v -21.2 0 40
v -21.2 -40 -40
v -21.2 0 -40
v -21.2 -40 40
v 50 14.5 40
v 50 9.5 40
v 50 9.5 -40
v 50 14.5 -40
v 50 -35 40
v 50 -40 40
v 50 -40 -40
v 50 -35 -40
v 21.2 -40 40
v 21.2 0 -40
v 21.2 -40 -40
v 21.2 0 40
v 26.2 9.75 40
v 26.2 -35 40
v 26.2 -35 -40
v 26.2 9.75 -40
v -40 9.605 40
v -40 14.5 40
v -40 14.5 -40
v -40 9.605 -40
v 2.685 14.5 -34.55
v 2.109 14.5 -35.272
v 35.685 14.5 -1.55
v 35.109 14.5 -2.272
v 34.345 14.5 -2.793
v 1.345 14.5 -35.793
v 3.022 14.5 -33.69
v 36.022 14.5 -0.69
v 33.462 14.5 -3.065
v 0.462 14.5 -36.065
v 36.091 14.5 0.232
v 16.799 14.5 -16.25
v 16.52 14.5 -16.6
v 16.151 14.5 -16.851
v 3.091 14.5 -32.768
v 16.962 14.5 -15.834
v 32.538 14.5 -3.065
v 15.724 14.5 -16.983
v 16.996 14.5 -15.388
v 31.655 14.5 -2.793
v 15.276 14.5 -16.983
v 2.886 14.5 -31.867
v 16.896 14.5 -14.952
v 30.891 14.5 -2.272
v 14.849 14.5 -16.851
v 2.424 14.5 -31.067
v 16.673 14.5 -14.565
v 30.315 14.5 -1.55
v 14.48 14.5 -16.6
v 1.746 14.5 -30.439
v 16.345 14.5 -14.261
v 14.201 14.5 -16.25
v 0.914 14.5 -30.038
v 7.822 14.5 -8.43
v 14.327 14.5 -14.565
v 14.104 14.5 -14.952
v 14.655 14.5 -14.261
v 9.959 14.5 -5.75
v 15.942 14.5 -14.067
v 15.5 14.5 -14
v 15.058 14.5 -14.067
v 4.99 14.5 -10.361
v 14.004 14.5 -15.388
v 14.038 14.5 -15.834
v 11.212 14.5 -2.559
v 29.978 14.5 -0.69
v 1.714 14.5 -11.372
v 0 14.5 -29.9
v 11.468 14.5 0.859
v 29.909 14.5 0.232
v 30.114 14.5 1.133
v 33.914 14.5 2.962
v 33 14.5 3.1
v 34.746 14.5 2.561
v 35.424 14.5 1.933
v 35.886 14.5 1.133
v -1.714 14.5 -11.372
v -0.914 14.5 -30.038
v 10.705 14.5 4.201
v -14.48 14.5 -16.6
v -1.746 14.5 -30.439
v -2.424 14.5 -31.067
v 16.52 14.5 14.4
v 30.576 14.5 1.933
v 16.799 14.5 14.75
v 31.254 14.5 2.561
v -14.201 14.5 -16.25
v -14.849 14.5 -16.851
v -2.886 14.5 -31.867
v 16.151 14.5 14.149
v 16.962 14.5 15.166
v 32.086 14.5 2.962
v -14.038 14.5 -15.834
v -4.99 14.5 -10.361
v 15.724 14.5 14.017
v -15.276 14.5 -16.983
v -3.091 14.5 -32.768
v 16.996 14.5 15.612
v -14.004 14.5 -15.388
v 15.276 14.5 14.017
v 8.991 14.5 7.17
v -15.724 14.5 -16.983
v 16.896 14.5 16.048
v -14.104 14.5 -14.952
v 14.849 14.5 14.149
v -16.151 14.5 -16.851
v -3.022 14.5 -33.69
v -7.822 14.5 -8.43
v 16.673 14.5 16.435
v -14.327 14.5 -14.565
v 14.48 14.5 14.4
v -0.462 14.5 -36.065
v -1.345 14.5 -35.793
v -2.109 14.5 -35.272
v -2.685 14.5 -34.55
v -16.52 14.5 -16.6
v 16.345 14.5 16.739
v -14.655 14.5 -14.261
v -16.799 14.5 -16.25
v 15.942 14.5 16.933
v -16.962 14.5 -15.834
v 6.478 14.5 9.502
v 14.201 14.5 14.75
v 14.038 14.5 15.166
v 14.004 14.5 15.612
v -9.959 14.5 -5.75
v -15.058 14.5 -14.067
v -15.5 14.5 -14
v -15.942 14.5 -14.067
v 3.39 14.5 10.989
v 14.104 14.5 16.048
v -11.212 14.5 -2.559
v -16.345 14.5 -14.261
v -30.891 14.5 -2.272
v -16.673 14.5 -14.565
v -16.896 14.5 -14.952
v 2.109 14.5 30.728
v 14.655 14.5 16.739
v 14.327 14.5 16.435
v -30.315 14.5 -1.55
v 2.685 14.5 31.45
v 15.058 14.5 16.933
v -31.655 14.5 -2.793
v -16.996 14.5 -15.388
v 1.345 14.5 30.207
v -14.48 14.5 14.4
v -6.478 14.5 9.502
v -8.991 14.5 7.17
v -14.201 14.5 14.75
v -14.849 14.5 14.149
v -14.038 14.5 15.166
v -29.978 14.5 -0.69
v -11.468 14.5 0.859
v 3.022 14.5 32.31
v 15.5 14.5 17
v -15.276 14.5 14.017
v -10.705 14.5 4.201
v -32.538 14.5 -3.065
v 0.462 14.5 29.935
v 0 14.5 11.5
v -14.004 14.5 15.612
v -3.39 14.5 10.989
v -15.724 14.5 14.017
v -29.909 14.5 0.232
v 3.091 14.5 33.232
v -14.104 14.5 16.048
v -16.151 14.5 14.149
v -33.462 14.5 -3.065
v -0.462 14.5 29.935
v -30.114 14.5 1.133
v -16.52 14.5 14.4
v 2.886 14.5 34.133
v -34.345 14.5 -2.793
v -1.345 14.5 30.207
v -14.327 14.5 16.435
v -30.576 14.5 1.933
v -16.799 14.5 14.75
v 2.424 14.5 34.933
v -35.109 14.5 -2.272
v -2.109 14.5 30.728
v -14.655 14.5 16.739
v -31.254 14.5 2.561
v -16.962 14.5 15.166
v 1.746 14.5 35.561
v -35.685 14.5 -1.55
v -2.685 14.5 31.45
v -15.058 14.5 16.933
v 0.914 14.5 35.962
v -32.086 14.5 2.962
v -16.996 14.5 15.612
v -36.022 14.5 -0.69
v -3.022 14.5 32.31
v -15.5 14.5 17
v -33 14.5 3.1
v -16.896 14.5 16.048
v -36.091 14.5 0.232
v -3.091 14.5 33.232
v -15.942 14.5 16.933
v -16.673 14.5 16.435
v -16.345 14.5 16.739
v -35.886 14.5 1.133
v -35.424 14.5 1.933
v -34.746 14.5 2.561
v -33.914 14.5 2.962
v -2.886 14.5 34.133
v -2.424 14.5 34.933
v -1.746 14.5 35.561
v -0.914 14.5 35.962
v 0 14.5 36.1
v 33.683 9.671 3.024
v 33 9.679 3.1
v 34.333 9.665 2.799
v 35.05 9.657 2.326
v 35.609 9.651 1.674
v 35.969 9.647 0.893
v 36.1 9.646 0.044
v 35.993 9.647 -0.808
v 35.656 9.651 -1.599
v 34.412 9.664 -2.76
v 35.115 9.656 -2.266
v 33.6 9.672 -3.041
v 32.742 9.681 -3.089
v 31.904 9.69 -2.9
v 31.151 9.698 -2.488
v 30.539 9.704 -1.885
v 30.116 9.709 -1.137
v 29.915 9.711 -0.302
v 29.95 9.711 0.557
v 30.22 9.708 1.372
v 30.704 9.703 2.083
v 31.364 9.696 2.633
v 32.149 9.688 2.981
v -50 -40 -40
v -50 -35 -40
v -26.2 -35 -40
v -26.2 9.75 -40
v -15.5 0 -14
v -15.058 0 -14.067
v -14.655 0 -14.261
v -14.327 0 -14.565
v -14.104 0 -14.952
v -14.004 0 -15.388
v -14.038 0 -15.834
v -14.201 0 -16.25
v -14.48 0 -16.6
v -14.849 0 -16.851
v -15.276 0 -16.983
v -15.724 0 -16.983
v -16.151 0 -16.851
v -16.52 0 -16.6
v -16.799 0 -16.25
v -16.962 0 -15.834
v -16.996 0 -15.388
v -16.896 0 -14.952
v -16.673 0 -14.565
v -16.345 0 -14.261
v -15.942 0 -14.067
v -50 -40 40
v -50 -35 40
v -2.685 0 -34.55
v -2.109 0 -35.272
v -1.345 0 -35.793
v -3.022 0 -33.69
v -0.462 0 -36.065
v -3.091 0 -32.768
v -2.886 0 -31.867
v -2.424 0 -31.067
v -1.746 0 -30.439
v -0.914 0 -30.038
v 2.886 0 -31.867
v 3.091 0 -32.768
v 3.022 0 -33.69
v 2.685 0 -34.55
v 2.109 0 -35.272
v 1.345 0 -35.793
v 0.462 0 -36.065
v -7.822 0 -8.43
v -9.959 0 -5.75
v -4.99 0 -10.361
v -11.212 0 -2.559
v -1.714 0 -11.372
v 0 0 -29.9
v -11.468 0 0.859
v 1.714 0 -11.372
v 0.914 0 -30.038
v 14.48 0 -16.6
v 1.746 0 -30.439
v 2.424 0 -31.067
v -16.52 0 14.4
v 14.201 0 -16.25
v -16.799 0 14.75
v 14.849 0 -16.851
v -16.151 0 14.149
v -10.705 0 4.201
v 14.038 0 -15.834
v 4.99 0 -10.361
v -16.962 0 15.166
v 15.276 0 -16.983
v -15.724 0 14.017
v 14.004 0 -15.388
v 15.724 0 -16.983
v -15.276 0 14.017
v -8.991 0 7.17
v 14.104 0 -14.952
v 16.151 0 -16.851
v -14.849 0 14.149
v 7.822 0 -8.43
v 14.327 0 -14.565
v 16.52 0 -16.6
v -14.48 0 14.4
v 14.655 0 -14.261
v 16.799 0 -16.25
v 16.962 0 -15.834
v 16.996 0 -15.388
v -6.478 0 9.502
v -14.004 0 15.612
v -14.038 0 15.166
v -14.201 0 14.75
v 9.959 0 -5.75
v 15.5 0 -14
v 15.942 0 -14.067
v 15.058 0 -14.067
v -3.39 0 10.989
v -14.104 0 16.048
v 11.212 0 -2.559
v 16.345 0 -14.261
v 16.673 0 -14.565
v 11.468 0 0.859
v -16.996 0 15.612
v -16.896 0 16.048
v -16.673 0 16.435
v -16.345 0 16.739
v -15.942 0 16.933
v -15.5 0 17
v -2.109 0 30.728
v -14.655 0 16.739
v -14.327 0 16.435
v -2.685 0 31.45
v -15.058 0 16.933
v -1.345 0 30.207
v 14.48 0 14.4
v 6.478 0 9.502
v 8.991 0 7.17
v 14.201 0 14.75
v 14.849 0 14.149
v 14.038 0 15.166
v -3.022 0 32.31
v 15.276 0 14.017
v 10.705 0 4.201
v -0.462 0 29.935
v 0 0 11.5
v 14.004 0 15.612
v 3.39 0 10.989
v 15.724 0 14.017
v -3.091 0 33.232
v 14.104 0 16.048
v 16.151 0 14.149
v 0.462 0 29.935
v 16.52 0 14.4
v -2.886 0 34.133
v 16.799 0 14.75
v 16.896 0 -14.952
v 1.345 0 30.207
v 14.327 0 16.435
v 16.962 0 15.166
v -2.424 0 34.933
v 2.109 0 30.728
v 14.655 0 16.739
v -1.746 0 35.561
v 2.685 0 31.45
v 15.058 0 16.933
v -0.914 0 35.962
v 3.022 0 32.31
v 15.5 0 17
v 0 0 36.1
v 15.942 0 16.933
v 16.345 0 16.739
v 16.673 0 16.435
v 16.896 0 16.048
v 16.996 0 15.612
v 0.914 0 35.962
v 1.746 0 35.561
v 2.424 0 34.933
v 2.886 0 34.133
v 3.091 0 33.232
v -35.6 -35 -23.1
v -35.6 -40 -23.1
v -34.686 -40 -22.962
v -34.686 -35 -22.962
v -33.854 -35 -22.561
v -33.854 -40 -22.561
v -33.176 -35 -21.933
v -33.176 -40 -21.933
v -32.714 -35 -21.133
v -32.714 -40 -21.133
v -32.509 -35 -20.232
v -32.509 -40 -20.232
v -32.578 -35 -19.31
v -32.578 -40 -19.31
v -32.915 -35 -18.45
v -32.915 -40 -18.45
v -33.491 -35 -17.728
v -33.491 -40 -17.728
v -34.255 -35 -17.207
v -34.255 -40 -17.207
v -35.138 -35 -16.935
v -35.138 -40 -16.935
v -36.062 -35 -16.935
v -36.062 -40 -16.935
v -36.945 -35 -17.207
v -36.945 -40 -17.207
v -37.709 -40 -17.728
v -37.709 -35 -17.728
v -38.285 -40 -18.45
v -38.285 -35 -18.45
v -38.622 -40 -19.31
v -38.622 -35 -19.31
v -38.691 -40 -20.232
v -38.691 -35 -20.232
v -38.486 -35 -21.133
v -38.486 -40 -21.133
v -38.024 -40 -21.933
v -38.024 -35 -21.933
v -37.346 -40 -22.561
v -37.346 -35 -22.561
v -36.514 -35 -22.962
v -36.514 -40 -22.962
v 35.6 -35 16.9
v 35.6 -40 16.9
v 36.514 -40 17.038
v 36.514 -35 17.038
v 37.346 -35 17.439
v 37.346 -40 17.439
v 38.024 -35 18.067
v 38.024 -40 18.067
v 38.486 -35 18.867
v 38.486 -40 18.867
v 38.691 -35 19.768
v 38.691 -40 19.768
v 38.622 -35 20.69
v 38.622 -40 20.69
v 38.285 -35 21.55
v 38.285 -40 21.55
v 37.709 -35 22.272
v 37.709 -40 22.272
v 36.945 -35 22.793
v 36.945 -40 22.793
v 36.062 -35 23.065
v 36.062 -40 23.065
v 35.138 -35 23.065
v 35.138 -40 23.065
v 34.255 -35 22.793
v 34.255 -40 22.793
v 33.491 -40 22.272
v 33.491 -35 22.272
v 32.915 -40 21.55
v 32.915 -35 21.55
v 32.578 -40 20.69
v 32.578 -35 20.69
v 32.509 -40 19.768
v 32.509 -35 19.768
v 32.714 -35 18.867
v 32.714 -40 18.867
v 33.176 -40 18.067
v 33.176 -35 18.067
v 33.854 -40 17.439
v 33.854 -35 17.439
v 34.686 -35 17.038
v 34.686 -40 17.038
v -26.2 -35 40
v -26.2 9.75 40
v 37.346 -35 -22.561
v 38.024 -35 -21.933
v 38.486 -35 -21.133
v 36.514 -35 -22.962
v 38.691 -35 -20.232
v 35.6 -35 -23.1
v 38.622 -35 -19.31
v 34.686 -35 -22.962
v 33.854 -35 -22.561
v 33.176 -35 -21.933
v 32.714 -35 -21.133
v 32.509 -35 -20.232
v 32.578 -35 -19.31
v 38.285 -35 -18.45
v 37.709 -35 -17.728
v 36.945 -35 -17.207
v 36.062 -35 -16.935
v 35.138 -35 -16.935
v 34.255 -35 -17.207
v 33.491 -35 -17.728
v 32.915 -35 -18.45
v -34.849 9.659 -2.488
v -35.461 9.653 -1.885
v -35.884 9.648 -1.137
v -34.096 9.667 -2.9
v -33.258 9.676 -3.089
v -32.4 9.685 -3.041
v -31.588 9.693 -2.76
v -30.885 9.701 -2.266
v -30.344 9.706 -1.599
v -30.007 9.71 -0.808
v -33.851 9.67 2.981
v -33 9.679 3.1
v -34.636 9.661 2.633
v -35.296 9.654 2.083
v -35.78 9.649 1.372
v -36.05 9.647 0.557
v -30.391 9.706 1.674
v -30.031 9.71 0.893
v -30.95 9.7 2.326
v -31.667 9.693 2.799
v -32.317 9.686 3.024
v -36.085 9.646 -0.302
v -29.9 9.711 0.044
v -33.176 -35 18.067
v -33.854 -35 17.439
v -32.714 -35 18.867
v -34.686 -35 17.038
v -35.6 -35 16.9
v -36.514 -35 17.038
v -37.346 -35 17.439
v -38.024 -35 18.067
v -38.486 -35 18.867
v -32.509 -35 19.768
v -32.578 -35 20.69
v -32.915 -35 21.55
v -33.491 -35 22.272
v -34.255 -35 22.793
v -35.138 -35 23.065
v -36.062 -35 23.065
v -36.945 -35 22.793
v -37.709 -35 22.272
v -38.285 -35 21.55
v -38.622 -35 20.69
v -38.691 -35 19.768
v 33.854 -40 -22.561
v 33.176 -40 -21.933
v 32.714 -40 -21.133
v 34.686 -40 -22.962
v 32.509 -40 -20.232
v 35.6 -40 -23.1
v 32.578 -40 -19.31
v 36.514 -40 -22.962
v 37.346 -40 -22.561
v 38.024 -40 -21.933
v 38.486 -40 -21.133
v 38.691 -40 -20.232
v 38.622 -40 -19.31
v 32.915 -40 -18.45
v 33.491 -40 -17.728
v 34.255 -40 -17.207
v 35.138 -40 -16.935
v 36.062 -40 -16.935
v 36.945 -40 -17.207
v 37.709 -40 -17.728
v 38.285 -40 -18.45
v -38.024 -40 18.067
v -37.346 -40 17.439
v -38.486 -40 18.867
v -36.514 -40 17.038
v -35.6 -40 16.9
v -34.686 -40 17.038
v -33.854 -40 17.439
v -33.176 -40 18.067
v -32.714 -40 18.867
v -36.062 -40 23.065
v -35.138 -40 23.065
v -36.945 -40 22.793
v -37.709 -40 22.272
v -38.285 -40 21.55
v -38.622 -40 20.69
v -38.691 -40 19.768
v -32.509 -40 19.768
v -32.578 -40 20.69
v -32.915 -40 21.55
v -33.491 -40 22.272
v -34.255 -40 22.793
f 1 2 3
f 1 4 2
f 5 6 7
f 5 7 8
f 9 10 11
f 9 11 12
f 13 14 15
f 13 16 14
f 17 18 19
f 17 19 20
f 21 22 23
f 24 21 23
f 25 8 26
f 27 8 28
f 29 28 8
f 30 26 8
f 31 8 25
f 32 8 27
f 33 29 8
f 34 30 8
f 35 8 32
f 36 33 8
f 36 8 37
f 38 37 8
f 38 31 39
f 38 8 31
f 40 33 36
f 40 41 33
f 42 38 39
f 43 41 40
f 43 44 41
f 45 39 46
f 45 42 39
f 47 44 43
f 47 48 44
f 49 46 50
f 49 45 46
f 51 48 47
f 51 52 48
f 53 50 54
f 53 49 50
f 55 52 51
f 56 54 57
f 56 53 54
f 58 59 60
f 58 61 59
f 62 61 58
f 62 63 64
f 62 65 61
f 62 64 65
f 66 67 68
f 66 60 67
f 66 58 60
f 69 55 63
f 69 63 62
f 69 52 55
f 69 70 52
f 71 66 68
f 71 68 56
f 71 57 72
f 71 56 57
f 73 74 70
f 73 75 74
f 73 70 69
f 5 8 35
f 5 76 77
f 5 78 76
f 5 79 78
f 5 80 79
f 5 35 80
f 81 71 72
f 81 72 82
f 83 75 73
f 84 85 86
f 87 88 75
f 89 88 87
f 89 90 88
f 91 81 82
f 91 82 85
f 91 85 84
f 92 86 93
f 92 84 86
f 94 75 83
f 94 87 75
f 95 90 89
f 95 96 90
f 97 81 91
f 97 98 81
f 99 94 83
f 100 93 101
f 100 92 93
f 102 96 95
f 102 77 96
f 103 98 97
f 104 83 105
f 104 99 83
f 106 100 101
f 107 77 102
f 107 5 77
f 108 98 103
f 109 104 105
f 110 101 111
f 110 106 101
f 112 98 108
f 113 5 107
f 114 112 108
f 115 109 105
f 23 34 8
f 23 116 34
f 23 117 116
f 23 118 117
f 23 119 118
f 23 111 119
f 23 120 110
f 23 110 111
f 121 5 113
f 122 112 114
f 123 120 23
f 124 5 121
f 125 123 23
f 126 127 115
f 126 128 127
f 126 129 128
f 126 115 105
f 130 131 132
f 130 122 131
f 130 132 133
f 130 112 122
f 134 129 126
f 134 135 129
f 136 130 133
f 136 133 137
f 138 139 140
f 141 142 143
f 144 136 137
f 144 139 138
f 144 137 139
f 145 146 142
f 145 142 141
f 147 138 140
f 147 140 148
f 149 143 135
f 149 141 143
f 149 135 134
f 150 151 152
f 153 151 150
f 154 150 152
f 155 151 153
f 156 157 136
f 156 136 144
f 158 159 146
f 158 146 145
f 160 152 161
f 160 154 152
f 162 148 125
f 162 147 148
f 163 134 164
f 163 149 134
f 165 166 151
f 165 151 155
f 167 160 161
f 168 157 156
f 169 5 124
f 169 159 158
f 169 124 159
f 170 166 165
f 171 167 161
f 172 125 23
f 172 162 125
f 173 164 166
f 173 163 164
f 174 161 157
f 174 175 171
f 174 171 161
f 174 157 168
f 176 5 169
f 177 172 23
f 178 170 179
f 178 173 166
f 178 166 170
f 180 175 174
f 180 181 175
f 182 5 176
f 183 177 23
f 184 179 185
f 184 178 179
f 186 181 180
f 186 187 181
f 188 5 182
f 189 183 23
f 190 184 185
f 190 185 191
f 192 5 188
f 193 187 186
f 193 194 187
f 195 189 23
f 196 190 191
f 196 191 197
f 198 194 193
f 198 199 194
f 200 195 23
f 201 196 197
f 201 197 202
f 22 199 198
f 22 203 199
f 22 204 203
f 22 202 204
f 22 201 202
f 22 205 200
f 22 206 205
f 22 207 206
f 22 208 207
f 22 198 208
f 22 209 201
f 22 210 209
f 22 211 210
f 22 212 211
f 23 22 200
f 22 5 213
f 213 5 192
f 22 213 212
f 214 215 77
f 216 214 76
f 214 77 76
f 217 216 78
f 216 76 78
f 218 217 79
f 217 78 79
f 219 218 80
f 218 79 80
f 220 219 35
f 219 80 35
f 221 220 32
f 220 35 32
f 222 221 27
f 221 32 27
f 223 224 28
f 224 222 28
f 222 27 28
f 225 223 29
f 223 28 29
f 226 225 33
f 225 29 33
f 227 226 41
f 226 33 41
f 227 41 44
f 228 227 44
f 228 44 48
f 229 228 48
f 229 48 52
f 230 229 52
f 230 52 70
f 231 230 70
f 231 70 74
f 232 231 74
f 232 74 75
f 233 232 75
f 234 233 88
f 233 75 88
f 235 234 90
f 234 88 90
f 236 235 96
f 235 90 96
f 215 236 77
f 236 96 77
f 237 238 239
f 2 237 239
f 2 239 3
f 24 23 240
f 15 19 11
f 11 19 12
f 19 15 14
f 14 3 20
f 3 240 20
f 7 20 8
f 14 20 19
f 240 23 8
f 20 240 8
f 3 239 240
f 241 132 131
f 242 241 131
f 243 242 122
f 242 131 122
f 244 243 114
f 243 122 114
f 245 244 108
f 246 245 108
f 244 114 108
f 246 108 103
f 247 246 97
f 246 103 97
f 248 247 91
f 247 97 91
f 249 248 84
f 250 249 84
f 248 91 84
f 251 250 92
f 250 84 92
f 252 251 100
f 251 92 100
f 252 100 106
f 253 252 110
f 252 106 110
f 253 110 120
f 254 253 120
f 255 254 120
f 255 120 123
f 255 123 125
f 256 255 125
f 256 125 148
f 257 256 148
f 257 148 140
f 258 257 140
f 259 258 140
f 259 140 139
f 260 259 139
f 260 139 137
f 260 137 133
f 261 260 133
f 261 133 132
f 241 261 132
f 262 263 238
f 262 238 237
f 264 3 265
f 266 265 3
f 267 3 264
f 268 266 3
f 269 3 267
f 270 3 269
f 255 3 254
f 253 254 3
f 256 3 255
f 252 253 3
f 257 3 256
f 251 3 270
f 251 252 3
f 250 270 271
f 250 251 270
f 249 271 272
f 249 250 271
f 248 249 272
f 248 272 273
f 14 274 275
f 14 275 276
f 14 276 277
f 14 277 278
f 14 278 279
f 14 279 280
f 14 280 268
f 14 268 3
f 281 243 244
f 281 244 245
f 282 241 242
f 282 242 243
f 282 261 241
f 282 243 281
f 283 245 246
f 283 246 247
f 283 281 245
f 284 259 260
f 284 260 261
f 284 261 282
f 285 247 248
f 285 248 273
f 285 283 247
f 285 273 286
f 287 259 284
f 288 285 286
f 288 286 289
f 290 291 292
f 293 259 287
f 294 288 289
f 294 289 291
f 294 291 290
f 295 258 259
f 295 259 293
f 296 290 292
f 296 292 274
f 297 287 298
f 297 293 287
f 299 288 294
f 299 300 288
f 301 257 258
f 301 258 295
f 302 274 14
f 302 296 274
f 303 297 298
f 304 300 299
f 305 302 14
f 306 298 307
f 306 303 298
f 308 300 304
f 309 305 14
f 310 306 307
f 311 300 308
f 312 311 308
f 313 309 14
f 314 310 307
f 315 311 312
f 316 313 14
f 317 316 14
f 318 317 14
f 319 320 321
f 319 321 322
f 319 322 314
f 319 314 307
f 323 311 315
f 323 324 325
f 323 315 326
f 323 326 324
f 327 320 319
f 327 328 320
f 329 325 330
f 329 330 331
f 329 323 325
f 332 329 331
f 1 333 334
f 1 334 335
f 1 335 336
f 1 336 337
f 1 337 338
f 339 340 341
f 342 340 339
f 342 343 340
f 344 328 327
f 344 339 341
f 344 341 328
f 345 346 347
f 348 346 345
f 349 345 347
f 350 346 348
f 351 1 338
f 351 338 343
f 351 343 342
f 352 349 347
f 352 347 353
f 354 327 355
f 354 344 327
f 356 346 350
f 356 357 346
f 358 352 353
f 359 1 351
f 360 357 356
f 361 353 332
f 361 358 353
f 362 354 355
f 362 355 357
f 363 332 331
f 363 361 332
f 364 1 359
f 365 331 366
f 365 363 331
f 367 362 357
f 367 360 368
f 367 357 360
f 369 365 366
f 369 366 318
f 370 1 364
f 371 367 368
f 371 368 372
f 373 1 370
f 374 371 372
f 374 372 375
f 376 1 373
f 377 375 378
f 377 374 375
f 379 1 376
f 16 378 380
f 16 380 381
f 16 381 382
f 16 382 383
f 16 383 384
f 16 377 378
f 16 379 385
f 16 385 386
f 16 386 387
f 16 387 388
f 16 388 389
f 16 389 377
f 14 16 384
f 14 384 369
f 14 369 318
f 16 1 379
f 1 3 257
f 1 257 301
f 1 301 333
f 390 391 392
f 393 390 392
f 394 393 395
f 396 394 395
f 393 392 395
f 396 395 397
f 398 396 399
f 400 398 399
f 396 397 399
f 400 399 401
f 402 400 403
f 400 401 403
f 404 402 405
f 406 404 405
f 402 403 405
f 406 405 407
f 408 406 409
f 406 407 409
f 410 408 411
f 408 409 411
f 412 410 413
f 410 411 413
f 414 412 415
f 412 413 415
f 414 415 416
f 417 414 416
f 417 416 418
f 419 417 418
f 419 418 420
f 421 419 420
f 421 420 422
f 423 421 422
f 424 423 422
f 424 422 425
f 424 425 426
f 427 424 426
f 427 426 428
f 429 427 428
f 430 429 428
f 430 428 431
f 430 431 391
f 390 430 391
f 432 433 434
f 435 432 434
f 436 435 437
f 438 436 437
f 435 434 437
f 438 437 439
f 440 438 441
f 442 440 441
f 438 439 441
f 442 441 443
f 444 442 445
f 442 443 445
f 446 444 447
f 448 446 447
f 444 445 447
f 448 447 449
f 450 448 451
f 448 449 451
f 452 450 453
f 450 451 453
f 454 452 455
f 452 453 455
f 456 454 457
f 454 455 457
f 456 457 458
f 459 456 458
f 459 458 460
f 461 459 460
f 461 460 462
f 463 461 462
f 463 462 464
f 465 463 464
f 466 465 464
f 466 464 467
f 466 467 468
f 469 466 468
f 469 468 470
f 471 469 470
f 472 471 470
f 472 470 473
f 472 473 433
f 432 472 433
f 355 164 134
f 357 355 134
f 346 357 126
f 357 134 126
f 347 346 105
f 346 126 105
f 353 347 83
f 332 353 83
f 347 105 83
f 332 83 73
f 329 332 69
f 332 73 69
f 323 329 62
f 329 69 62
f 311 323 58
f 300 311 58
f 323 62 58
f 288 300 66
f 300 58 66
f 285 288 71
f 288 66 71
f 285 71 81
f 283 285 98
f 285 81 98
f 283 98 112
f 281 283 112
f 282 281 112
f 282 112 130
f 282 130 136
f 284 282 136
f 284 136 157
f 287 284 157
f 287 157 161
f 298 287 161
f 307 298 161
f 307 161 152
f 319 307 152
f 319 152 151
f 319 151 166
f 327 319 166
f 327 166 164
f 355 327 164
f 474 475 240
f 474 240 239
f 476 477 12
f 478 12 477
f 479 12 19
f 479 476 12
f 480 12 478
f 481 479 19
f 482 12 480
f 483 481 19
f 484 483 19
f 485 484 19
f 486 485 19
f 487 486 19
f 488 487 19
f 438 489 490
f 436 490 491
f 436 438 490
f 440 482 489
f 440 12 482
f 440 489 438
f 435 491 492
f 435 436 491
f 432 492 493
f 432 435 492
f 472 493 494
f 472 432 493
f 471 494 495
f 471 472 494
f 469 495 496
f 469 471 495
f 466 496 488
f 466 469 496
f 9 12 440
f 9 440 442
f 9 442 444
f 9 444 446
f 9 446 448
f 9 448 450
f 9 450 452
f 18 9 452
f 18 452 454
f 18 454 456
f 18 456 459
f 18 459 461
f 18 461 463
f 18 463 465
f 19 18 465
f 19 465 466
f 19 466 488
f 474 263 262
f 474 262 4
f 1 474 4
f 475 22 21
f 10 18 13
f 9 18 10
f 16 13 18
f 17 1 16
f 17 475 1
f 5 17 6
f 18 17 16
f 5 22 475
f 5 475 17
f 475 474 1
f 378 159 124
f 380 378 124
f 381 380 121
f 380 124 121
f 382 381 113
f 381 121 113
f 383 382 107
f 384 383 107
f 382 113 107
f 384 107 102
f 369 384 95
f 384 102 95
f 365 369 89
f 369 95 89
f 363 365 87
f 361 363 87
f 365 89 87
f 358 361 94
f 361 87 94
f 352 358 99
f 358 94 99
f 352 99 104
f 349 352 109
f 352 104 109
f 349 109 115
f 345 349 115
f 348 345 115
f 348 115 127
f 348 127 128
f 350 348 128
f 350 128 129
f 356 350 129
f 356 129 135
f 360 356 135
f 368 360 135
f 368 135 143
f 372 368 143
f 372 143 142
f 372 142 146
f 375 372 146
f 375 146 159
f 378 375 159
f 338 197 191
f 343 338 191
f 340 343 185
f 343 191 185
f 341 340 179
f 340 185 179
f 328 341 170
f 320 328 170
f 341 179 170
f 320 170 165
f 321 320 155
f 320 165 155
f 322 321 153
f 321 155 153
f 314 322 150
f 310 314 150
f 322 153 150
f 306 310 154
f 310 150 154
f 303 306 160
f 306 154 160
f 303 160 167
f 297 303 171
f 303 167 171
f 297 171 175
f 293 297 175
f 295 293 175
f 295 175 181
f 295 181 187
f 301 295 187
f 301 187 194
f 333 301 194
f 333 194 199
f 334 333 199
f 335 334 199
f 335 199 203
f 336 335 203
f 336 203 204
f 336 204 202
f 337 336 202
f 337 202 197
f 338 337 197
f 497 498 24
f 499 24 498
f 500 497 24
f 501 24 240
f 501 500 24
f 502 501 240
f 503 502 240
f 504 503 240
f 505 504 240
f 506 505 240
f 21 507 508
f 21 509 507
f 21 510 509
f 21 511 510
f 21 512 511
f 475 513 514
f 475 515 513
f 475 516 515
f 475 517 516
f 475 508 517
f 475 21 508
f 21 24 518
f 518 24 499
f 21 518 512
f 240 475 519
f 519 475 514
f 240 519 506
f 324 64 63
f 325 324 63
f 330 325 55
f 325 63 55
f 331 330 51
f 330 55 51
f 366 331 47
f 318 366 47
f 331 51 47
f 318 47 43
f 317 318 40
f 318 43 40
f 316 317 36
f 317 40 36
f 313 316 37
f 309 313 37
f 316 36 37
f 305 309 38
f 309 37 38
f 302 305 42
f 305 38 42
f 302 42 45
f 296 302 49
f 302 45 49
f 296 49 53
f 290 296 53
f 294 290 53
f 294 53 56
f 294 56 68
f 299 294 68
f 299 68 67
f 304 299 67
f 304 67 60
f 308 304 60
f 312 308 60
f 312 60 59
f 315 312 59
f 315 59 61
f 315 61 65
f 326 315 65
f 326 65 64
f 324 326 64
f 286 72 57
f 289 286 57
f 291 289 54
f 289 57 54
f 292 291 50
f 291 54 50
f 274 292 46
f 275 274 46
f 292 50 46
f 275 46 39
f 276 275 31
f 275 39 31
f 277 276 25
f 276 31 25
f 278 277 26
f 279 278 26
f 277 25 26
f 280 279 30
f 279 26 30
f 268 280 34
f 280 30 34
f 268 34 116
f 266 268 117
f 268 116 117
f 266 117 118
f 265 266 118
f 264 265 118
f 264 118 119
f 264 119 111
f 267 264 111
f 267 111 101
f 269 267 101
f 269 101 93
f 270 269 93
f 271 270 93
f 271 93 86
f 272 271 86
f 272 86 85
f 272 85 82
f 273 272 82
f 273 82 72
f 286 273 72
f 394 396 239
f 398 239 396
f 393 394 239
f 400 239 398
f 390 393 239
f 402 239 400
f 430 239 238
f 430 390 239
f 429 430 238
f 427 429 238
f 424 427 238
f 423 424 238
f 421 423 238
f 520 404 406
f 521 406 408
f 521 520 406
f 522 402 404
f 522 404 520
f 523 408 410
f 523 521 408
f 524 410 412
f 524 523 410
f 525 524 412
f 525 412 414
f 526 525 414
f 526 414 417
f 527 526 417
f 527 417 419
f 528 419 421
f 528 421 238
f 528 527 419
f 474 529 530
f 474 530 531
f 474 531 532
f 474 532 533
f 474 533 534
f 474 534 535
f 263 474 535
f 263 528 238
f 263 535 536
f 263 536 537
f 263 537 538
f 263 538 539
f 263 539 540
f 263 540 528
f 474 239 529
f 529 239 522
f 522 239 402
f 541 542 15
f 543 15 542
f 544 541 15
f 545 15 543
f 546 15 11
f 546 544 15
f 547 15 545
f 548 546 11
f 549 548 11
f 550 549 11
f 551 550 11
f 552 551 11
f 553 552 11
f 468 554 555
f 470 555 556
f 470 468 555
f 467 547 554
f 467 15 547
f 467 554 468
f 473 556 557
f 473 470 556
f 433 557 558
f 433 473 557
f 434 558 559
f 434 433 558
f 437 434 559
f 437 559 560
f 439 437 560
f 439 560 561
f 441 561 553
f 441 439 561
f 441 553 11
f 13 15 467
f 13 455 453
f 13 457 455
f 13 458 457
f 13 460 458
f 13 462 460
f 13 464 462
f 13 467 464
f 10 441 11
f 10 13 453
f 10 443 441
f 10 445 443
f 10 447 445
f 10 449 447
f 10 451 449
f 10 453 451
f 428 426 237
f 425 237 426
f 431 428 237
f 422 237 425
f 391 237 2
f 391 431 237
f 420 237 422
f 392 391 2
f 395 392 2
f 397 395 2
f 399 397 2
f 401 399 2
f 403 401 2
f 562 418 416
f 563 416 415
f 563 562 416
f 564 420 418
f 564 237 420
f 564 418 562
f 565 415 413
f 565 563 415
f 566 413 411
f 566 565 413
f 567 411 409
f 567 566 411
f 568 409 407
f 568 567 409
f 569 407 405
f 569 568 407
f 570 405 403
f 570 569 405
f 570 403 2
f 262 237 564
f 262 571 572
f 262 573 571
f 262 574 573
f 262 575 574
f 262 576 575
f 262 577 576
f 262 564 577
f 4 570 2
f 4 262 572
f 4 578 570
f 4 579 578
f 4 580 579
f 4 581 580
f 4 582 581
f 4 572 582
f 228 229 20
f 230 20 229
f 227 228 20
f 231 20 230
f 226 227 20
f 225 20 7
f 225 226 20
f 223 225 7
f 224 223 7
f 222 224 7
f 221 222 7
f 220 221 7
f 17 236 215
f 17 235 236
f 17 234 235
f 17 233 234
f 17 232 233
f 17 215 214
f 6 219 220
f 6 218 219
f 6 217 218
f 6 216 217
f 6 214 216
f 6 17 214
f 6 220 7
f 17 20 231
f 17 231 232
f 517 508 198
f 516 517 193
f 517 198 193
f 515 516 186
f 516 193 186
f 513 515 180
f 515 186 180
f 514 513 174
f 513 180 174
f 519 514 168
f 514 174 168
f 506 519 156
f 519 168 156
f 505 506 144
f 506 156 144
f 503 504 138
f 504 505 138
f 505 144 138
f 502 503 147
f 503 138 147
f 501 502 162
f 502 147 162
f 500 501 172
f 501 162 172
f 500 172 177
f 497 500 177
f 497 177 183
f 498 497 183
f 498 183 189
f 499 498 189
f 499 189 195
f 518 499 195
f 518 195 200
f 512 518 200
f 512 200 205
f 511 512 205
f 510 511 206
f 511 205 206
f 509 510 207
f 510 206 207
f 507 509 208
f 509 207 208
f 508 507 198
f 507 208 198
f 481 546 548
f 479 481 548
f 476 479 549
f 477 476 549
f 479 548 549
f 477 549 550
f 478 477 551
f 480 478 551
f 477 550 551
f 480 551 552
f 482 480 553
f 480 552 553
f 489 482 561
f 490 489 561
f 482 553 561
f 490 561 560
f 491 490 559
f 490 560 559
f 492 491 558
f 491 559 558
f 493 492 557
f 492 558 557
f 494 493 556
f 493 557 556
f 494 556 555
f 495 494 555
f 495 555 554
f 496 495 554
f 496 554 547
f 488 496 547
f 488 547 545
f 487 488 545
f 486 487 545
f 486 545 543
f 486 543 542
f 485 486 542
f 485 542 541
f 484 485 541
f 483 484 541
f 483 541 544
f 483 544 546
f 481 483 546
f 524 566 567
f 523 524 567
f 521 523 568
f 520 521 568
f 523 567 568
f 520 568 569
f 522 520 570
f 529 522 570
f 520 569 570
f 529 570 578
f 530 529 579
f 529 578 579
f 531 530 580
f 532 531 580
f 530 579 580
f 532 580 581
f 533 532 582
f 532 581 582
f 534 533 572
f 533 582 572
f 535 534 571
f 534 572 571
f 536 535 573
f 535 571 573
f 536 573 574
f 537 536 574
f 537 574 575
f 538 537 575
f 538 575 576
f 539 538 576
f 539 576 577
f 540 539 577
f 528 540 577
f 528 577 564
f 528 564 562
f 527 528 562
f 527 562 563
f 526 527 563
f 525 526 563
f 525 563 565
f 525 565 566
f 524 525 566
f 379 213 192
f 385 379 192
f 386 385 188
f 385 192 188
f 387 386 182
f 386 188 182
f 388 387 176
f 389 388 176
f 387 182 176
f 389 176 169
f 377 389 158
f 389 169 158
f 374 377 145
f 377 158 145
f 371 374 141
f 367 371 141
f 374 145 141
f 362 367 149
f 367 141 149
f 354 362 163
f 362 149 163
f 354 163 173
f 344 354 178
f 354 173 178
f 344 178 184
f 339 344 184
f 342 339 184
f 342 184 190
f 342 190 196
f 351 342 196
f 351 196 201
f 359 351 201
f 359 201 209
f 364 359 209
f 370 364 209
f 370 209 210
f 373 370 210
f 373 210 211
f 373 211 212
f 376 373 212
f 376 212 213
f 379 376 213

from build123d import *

# Parameters (mm, degrees)
BOSS_EXTRUDE3_DEPTH = 40
SKETCH4_R           = 11.5
SKETCH4_R_2         = 1.5
CUT_EXTRUDE1_DEPTH  = 80
SKETCH5_R           = 3.1
CUT_EXTRUDE2_DEPTH  = 40
SKETCH9_R           = 3.1
CUT_EXTRUDE3_DEPTH  = 10
SKETCH11_W          = 10
SKETCH11_H          = 80
CUT_EXTRUDE4_DEPTH  = 10


with BuildPart() as part:
    # Sketch1 → Boss-Extrude3 (new, symmetric)
    with BuildSketch(Plane.XY):
        Polygon((0, 0), (21.2, 0), (21.2, -40), (50, -40), (50, -35), (26.2, -35), (26.2, 5), (26.2, 9.75), (50, 9.5), (50, 14.5), (26.15, 14.5), (-26.15, 14.5), (-50, 14.5), (-50, 9.5), (-26.2, 9.75), (-26.2, 5), (-26.2, -35), (-50, -35), (-50, -40), (-21.2, -40), (-21.2, 0), align=None)
    extrude(amount=BOSS_EXTRUDE3_DEPTH, both=True)

    # Sketch4 → Cut-Extrude1 (cut)
    with BuildSketch(Plane(origin=(0, 14.5, 0), x_dir=(1, 0, 0), z_dir=(0, 1, 0))):
        with Locations(Location((0, 0, 0), (0, 0, 270))):
            Circle(SKETCH4_R)
        with Locations(Location((-15.5, 15.5, 0), (0, 0, 270))):
            Circle(SKETCH4_R_2)
        with Locations(Location((-15.5, -15.5, 0), (0, 0, 270))):
            Circle(SKETCH4_R_2)
        with Locations(Location((15.5, -15.5, 0), (0, 0, 270))):
            Circle(SKETCH4_R_2)
        with Locations(Location((15.5, 15.5, 0), (0, 0, 270))):
            Circle(SKETCH4_R_2)
    extrude(amount=-CUT_EXTRUDE1_DEPTH, mode=Mode.SUBTRACT)

    # Sketch5 → Cut-Extrude2 (cut)
    with BuildSketch(Plane(origin=(0, 14.5, 0), x_dir=(1, 0, 0), z_dir=(0, 1, 0))):
        with Locations(Location((33, 0, 0), (0, 0, 270))):
            Circle(SKETCH5_R)
        with Locations(Location((0, -33, 0), (0, 0, 270))):
            Circle(SKETCH5_R)
        with Locations(Location((-33, 0, 0), (0, 0, 270))):
            Circle(SKETCH5_R)
        with Locations(Location((0, 33, 0), (0, 0, 270))):
            Circle(SKETCH5_R)
    extrude(amount=-CUT_EXTRUDE2_DEPTH, mode=Mode.SUBTRACT)

    # Sketch9 → Cut-Extrude3 (cut)
    with BuildSketch(Plane.XZ.offset(40)):
        with Locations(Location((35.6, 20, 0), (0, 0, 270))):
            Circle(SKETCH9_R)
        with Locations(Location((35.6, -20, 0), (0, 0, 270))):
            Circle(SKETCH9_R)
        with Locations(Location((-35.6, -20, 0), (0, 0, 270))):
            Circle(SKETCH9_R)
        with Locations(Location((-35.6, 20, 0), (0, 0, 270))):
            Circle(SKETCH9_R)
    extrude(amount=-CUT_EXTRUDE3_DEPTH, mode=Mode.SUBTRACT)

    # Sketch11 → Cut-Extrude4 (cut)
    with BuildSketch(Plane(origin=(0, 14.5, 0), x_dir=(1, 0, 0), z_dir=(0, 1, 0))):
        with Locations((-45, 0)):
            Rectangle(SKETCH11_W, SKETCH11_H)
    extrude(amount=-CUT_EXTRUDE4_DEPTH, mode=Mode.SUBTRACT)


solid = part.part
